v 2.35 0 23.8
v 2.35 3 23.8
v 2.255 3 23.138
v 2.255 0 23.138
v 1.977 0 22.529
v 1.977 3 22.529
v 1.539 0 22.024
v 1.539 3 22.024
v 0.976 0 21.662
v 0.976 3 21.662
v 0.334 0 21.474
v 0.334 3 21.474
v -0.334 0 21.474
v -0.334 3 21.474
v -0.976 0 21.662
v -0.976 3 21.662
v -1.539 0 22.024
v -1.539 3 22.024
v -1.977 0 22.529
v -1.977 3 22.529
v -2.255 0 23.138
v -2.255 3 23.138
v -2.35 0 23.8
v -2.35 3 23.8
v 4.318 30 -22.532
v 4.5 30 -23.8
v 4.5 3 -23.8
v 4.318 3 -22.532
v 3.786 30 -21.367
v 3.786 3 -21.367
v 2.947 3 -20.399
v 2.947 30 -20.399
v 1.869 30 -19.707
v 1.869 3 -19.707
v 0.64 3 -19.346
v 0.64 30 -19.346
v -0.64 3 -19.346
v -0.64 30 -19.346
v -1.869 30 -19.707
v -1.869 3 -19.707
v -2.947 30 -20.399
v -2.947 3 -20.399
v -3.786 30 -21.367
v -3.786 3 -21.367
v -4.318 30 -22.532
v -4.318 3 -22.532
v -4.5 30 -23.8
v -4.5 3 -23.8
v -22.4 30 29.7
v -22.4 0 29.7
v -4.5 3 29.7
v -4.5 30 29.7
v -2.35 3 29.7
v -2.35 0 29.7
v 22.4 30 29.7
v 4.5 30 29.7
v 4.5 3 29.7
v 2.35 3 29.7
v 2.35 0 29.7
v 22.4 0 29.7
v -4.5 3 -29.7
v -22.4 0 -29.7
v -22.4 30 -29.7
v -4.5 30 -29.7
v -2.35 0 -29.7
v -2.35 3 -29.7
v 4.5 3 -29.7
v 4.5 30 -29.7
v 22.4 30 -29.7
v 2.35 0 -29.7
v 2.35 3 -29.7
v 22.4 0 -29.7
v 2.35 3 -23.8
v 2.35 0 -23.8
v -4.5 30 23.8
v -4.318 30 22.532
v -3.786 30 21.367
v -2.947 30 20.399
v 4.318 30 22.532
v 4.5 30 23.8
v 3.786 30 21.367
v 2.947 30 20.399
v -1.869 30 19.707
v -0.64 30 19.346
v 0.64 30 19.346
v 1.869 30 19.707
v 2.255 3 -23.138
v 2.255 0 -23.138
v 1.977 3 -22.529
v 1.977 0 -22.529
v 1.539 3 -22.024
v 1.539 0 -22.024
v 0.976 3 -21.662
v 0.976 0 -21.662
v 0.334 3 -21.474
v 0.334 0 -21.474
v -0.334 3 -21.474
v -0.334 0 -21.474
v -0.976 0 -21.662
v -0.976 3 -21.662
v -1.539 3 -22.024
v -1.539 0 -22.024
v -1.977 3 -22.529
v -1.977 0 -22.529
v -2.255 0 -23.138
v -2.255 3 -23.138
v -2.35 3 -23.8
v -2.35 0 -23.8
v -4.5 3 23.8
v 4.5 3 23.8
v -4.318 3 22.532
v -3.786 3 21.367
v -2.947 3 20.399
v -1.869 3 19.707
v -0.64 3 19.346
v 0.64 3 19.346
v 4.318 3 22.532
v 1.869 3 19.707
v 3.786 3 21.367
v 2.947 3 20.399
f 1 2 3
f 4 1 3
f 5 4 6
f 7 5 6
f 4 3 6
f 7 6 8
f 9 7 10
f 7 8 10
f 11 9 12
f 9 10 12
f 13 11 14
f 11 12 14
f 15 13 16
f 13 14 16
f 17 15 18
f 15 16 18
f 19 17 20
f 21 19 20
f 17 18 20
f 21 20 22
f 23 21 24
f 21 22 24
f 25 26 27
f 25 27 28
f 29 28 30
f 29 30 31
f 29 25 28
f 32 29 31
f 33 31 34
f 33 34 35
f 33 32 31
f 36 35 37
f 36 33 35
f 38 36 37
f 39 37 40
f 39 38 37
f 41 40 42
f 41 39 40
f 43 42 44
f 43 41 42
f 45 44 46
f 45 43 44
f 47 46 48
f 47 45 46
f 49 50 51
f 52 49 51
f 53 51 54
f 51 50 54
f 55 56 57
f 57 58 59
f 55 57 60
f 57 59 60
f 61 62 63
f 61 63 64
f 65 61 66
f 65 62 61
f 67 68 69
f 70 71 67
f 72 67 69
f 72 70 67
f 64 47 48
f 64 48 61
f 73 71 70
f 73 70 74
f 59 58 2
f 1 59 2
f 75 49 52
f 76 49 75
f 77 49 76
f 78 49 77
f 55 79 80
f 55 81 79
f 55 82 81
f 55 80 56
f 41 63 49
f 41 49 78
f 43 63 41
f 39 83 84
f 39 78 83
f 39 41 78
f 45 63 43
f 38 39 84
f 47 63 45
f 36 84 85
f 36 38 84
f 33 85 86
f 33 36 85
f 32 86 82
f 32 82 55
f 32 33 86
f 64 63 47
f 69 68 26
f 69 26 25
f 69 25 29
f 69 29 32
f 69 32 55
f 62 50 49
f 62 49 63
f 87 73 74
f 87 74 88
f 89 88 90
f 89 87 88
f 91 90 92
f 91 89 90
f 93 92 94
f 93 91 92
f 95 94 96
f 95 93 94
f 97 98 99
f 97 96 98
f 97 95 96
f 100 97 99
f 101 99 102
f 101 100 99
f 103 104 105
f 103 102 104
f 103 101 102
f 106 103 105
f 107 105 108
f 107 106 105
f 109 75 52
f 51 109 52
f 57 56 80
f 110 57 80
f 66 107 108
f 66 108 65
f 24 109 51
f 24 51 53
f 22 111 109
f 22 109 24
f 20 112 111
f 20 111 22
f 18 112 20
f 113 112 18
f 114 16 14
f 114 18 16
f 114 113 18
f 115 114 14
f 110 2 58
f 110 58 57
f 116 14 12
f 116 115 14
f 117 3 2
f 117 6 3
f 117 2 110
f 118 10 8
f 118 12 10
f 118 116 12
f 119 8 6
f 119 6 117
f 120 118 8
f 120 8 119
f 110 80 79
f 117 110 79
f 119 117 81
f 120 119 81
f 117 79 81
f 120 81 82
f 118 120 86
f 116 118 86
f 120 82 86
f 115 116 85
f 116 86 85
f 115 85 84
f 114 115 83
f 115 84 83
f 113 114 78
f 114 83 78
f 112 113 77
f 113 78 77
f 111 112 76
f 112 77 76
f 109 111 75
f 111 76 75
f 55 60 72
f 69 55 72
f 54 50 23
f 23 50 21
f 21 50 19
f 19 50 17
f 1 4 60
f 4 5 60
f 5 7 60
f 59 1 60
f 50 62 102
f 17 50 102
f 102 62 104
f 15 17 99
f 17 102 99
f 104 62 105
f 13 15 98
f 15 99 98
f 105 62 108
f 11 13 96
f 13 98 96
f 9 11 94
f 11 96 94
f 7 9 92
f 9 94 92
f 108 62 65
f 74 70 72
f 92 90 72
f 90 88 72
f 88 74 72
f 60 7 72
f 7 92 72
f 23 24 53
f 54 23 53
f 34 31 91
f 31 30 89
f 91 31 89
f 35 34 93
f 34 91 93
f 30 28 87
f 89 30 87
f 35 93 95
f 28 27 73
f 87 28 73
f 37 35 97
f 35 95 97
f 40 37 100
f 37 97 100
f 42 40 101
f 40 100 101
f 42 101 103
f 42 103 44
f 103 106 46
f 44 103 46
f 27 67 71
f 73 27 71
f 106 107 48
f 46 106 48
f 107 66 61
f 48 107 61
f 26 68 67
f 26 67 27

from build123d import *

# Parameters (mm, degrees)
SKETCH1_W           = 44.8
SKETCH1_H           = 59.4
BOSS_EXTRUDE1_DEPTH = 30
CUT_EXTRUDE1_DEPTH  = 27
CUT_EXTRUDE2_DEPTH  = 46.965748117


with BuildPart() as part:
    # Sketch1 → Boss-Extrude1 (new body)
    with BuildSketch(Plane(origin=(0, 0, 0), x_dir=(1, 0, 0), z_dir=(0, 1, 0))):
        Rectangle(SKETCH1_W, SKETCH1_H)
    extrude(amount=BOSS_EXTRUDE1_DEPTH)

    # Sketch3 → Cut-Extrude1 (cut)
    with BuildSketch(Plane(origin=(0, 30, 0), x_dir=(1, 0, 0), z_dir=(0, 1, 0))):
        with BuildLine():
            Line((-4.5, 23.8), (-4.5, 30.7))
            Line((-4.5, 30.7), (4.5, 30.7))
            Line((4.5, 30.7), (4.5, 23.8))
            ThreePointArc((4.5, 23.8), (0, 19.3), (-4.5, 23.8))
        make_face()
        with BuildLine():
            Line((-4.5, -23.8), (-4.5, -30.7))
            Line((-4.5, -30.7), (4.5, -30.7))
            Line((4.5, -30.7), (4.5, -23.8))
            ThreePointArc((4.5, -23.8), (0, -19.3), (-4.5, -23.8))
        make_face()
    extrude(amount=-CUT_EXTRUDE1_DEPTH, mode=Mode.SUBTRACT)

    # Sketch4 → Cut-Extrude2 (cut, through all)
    with BuildSketch(Plane(origin=(0, 3, 0), x_dir=(1, 0, 0), z_dir=(0, 1, 0))):
        with BuildLine():
            Line((-2.35, 23.8), (-2.35, 29.7))
            Line((-2.35, 29.7), (2.35, 29.7))
            Line((2.35, 29.7), (2.35, 23.8))
            ThreePointArc((2.35, 23.8), (0, 21.45), (-2.35, 23.8))
        make_face()
        with BuildLine():
            Line((-2.35, -23.8), (-2.35, -29.7))
            Line((-2.35, -29.7), (2.35, -29.7))
            Line((2.35, -29.7), (2.35, -23.8))
            ThreePointArc((2.35, -23.8), (0, -21.45), (-2.35, -23.8))
        make_face()
    extrude(amount=-CUT_EXTRUDE2_DEPTH, mode=Mode.SUBTRACT)


solid = part.part
